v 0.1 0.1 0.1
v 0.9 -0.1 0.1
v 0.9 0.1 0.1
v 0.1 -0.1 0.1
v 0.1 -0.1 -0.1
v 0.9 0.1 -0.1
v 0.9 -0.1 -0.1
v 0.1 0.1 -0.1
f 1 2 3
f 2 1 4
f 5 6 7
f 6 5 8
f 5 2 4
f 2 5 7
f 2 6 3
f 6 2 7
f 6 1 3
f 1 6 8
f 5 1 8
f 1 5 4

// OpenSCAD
color([0.3, 0.3, 0.5])
translate([0.1,-0.1,-0.1])
cube([.8, .2, .2], false);
